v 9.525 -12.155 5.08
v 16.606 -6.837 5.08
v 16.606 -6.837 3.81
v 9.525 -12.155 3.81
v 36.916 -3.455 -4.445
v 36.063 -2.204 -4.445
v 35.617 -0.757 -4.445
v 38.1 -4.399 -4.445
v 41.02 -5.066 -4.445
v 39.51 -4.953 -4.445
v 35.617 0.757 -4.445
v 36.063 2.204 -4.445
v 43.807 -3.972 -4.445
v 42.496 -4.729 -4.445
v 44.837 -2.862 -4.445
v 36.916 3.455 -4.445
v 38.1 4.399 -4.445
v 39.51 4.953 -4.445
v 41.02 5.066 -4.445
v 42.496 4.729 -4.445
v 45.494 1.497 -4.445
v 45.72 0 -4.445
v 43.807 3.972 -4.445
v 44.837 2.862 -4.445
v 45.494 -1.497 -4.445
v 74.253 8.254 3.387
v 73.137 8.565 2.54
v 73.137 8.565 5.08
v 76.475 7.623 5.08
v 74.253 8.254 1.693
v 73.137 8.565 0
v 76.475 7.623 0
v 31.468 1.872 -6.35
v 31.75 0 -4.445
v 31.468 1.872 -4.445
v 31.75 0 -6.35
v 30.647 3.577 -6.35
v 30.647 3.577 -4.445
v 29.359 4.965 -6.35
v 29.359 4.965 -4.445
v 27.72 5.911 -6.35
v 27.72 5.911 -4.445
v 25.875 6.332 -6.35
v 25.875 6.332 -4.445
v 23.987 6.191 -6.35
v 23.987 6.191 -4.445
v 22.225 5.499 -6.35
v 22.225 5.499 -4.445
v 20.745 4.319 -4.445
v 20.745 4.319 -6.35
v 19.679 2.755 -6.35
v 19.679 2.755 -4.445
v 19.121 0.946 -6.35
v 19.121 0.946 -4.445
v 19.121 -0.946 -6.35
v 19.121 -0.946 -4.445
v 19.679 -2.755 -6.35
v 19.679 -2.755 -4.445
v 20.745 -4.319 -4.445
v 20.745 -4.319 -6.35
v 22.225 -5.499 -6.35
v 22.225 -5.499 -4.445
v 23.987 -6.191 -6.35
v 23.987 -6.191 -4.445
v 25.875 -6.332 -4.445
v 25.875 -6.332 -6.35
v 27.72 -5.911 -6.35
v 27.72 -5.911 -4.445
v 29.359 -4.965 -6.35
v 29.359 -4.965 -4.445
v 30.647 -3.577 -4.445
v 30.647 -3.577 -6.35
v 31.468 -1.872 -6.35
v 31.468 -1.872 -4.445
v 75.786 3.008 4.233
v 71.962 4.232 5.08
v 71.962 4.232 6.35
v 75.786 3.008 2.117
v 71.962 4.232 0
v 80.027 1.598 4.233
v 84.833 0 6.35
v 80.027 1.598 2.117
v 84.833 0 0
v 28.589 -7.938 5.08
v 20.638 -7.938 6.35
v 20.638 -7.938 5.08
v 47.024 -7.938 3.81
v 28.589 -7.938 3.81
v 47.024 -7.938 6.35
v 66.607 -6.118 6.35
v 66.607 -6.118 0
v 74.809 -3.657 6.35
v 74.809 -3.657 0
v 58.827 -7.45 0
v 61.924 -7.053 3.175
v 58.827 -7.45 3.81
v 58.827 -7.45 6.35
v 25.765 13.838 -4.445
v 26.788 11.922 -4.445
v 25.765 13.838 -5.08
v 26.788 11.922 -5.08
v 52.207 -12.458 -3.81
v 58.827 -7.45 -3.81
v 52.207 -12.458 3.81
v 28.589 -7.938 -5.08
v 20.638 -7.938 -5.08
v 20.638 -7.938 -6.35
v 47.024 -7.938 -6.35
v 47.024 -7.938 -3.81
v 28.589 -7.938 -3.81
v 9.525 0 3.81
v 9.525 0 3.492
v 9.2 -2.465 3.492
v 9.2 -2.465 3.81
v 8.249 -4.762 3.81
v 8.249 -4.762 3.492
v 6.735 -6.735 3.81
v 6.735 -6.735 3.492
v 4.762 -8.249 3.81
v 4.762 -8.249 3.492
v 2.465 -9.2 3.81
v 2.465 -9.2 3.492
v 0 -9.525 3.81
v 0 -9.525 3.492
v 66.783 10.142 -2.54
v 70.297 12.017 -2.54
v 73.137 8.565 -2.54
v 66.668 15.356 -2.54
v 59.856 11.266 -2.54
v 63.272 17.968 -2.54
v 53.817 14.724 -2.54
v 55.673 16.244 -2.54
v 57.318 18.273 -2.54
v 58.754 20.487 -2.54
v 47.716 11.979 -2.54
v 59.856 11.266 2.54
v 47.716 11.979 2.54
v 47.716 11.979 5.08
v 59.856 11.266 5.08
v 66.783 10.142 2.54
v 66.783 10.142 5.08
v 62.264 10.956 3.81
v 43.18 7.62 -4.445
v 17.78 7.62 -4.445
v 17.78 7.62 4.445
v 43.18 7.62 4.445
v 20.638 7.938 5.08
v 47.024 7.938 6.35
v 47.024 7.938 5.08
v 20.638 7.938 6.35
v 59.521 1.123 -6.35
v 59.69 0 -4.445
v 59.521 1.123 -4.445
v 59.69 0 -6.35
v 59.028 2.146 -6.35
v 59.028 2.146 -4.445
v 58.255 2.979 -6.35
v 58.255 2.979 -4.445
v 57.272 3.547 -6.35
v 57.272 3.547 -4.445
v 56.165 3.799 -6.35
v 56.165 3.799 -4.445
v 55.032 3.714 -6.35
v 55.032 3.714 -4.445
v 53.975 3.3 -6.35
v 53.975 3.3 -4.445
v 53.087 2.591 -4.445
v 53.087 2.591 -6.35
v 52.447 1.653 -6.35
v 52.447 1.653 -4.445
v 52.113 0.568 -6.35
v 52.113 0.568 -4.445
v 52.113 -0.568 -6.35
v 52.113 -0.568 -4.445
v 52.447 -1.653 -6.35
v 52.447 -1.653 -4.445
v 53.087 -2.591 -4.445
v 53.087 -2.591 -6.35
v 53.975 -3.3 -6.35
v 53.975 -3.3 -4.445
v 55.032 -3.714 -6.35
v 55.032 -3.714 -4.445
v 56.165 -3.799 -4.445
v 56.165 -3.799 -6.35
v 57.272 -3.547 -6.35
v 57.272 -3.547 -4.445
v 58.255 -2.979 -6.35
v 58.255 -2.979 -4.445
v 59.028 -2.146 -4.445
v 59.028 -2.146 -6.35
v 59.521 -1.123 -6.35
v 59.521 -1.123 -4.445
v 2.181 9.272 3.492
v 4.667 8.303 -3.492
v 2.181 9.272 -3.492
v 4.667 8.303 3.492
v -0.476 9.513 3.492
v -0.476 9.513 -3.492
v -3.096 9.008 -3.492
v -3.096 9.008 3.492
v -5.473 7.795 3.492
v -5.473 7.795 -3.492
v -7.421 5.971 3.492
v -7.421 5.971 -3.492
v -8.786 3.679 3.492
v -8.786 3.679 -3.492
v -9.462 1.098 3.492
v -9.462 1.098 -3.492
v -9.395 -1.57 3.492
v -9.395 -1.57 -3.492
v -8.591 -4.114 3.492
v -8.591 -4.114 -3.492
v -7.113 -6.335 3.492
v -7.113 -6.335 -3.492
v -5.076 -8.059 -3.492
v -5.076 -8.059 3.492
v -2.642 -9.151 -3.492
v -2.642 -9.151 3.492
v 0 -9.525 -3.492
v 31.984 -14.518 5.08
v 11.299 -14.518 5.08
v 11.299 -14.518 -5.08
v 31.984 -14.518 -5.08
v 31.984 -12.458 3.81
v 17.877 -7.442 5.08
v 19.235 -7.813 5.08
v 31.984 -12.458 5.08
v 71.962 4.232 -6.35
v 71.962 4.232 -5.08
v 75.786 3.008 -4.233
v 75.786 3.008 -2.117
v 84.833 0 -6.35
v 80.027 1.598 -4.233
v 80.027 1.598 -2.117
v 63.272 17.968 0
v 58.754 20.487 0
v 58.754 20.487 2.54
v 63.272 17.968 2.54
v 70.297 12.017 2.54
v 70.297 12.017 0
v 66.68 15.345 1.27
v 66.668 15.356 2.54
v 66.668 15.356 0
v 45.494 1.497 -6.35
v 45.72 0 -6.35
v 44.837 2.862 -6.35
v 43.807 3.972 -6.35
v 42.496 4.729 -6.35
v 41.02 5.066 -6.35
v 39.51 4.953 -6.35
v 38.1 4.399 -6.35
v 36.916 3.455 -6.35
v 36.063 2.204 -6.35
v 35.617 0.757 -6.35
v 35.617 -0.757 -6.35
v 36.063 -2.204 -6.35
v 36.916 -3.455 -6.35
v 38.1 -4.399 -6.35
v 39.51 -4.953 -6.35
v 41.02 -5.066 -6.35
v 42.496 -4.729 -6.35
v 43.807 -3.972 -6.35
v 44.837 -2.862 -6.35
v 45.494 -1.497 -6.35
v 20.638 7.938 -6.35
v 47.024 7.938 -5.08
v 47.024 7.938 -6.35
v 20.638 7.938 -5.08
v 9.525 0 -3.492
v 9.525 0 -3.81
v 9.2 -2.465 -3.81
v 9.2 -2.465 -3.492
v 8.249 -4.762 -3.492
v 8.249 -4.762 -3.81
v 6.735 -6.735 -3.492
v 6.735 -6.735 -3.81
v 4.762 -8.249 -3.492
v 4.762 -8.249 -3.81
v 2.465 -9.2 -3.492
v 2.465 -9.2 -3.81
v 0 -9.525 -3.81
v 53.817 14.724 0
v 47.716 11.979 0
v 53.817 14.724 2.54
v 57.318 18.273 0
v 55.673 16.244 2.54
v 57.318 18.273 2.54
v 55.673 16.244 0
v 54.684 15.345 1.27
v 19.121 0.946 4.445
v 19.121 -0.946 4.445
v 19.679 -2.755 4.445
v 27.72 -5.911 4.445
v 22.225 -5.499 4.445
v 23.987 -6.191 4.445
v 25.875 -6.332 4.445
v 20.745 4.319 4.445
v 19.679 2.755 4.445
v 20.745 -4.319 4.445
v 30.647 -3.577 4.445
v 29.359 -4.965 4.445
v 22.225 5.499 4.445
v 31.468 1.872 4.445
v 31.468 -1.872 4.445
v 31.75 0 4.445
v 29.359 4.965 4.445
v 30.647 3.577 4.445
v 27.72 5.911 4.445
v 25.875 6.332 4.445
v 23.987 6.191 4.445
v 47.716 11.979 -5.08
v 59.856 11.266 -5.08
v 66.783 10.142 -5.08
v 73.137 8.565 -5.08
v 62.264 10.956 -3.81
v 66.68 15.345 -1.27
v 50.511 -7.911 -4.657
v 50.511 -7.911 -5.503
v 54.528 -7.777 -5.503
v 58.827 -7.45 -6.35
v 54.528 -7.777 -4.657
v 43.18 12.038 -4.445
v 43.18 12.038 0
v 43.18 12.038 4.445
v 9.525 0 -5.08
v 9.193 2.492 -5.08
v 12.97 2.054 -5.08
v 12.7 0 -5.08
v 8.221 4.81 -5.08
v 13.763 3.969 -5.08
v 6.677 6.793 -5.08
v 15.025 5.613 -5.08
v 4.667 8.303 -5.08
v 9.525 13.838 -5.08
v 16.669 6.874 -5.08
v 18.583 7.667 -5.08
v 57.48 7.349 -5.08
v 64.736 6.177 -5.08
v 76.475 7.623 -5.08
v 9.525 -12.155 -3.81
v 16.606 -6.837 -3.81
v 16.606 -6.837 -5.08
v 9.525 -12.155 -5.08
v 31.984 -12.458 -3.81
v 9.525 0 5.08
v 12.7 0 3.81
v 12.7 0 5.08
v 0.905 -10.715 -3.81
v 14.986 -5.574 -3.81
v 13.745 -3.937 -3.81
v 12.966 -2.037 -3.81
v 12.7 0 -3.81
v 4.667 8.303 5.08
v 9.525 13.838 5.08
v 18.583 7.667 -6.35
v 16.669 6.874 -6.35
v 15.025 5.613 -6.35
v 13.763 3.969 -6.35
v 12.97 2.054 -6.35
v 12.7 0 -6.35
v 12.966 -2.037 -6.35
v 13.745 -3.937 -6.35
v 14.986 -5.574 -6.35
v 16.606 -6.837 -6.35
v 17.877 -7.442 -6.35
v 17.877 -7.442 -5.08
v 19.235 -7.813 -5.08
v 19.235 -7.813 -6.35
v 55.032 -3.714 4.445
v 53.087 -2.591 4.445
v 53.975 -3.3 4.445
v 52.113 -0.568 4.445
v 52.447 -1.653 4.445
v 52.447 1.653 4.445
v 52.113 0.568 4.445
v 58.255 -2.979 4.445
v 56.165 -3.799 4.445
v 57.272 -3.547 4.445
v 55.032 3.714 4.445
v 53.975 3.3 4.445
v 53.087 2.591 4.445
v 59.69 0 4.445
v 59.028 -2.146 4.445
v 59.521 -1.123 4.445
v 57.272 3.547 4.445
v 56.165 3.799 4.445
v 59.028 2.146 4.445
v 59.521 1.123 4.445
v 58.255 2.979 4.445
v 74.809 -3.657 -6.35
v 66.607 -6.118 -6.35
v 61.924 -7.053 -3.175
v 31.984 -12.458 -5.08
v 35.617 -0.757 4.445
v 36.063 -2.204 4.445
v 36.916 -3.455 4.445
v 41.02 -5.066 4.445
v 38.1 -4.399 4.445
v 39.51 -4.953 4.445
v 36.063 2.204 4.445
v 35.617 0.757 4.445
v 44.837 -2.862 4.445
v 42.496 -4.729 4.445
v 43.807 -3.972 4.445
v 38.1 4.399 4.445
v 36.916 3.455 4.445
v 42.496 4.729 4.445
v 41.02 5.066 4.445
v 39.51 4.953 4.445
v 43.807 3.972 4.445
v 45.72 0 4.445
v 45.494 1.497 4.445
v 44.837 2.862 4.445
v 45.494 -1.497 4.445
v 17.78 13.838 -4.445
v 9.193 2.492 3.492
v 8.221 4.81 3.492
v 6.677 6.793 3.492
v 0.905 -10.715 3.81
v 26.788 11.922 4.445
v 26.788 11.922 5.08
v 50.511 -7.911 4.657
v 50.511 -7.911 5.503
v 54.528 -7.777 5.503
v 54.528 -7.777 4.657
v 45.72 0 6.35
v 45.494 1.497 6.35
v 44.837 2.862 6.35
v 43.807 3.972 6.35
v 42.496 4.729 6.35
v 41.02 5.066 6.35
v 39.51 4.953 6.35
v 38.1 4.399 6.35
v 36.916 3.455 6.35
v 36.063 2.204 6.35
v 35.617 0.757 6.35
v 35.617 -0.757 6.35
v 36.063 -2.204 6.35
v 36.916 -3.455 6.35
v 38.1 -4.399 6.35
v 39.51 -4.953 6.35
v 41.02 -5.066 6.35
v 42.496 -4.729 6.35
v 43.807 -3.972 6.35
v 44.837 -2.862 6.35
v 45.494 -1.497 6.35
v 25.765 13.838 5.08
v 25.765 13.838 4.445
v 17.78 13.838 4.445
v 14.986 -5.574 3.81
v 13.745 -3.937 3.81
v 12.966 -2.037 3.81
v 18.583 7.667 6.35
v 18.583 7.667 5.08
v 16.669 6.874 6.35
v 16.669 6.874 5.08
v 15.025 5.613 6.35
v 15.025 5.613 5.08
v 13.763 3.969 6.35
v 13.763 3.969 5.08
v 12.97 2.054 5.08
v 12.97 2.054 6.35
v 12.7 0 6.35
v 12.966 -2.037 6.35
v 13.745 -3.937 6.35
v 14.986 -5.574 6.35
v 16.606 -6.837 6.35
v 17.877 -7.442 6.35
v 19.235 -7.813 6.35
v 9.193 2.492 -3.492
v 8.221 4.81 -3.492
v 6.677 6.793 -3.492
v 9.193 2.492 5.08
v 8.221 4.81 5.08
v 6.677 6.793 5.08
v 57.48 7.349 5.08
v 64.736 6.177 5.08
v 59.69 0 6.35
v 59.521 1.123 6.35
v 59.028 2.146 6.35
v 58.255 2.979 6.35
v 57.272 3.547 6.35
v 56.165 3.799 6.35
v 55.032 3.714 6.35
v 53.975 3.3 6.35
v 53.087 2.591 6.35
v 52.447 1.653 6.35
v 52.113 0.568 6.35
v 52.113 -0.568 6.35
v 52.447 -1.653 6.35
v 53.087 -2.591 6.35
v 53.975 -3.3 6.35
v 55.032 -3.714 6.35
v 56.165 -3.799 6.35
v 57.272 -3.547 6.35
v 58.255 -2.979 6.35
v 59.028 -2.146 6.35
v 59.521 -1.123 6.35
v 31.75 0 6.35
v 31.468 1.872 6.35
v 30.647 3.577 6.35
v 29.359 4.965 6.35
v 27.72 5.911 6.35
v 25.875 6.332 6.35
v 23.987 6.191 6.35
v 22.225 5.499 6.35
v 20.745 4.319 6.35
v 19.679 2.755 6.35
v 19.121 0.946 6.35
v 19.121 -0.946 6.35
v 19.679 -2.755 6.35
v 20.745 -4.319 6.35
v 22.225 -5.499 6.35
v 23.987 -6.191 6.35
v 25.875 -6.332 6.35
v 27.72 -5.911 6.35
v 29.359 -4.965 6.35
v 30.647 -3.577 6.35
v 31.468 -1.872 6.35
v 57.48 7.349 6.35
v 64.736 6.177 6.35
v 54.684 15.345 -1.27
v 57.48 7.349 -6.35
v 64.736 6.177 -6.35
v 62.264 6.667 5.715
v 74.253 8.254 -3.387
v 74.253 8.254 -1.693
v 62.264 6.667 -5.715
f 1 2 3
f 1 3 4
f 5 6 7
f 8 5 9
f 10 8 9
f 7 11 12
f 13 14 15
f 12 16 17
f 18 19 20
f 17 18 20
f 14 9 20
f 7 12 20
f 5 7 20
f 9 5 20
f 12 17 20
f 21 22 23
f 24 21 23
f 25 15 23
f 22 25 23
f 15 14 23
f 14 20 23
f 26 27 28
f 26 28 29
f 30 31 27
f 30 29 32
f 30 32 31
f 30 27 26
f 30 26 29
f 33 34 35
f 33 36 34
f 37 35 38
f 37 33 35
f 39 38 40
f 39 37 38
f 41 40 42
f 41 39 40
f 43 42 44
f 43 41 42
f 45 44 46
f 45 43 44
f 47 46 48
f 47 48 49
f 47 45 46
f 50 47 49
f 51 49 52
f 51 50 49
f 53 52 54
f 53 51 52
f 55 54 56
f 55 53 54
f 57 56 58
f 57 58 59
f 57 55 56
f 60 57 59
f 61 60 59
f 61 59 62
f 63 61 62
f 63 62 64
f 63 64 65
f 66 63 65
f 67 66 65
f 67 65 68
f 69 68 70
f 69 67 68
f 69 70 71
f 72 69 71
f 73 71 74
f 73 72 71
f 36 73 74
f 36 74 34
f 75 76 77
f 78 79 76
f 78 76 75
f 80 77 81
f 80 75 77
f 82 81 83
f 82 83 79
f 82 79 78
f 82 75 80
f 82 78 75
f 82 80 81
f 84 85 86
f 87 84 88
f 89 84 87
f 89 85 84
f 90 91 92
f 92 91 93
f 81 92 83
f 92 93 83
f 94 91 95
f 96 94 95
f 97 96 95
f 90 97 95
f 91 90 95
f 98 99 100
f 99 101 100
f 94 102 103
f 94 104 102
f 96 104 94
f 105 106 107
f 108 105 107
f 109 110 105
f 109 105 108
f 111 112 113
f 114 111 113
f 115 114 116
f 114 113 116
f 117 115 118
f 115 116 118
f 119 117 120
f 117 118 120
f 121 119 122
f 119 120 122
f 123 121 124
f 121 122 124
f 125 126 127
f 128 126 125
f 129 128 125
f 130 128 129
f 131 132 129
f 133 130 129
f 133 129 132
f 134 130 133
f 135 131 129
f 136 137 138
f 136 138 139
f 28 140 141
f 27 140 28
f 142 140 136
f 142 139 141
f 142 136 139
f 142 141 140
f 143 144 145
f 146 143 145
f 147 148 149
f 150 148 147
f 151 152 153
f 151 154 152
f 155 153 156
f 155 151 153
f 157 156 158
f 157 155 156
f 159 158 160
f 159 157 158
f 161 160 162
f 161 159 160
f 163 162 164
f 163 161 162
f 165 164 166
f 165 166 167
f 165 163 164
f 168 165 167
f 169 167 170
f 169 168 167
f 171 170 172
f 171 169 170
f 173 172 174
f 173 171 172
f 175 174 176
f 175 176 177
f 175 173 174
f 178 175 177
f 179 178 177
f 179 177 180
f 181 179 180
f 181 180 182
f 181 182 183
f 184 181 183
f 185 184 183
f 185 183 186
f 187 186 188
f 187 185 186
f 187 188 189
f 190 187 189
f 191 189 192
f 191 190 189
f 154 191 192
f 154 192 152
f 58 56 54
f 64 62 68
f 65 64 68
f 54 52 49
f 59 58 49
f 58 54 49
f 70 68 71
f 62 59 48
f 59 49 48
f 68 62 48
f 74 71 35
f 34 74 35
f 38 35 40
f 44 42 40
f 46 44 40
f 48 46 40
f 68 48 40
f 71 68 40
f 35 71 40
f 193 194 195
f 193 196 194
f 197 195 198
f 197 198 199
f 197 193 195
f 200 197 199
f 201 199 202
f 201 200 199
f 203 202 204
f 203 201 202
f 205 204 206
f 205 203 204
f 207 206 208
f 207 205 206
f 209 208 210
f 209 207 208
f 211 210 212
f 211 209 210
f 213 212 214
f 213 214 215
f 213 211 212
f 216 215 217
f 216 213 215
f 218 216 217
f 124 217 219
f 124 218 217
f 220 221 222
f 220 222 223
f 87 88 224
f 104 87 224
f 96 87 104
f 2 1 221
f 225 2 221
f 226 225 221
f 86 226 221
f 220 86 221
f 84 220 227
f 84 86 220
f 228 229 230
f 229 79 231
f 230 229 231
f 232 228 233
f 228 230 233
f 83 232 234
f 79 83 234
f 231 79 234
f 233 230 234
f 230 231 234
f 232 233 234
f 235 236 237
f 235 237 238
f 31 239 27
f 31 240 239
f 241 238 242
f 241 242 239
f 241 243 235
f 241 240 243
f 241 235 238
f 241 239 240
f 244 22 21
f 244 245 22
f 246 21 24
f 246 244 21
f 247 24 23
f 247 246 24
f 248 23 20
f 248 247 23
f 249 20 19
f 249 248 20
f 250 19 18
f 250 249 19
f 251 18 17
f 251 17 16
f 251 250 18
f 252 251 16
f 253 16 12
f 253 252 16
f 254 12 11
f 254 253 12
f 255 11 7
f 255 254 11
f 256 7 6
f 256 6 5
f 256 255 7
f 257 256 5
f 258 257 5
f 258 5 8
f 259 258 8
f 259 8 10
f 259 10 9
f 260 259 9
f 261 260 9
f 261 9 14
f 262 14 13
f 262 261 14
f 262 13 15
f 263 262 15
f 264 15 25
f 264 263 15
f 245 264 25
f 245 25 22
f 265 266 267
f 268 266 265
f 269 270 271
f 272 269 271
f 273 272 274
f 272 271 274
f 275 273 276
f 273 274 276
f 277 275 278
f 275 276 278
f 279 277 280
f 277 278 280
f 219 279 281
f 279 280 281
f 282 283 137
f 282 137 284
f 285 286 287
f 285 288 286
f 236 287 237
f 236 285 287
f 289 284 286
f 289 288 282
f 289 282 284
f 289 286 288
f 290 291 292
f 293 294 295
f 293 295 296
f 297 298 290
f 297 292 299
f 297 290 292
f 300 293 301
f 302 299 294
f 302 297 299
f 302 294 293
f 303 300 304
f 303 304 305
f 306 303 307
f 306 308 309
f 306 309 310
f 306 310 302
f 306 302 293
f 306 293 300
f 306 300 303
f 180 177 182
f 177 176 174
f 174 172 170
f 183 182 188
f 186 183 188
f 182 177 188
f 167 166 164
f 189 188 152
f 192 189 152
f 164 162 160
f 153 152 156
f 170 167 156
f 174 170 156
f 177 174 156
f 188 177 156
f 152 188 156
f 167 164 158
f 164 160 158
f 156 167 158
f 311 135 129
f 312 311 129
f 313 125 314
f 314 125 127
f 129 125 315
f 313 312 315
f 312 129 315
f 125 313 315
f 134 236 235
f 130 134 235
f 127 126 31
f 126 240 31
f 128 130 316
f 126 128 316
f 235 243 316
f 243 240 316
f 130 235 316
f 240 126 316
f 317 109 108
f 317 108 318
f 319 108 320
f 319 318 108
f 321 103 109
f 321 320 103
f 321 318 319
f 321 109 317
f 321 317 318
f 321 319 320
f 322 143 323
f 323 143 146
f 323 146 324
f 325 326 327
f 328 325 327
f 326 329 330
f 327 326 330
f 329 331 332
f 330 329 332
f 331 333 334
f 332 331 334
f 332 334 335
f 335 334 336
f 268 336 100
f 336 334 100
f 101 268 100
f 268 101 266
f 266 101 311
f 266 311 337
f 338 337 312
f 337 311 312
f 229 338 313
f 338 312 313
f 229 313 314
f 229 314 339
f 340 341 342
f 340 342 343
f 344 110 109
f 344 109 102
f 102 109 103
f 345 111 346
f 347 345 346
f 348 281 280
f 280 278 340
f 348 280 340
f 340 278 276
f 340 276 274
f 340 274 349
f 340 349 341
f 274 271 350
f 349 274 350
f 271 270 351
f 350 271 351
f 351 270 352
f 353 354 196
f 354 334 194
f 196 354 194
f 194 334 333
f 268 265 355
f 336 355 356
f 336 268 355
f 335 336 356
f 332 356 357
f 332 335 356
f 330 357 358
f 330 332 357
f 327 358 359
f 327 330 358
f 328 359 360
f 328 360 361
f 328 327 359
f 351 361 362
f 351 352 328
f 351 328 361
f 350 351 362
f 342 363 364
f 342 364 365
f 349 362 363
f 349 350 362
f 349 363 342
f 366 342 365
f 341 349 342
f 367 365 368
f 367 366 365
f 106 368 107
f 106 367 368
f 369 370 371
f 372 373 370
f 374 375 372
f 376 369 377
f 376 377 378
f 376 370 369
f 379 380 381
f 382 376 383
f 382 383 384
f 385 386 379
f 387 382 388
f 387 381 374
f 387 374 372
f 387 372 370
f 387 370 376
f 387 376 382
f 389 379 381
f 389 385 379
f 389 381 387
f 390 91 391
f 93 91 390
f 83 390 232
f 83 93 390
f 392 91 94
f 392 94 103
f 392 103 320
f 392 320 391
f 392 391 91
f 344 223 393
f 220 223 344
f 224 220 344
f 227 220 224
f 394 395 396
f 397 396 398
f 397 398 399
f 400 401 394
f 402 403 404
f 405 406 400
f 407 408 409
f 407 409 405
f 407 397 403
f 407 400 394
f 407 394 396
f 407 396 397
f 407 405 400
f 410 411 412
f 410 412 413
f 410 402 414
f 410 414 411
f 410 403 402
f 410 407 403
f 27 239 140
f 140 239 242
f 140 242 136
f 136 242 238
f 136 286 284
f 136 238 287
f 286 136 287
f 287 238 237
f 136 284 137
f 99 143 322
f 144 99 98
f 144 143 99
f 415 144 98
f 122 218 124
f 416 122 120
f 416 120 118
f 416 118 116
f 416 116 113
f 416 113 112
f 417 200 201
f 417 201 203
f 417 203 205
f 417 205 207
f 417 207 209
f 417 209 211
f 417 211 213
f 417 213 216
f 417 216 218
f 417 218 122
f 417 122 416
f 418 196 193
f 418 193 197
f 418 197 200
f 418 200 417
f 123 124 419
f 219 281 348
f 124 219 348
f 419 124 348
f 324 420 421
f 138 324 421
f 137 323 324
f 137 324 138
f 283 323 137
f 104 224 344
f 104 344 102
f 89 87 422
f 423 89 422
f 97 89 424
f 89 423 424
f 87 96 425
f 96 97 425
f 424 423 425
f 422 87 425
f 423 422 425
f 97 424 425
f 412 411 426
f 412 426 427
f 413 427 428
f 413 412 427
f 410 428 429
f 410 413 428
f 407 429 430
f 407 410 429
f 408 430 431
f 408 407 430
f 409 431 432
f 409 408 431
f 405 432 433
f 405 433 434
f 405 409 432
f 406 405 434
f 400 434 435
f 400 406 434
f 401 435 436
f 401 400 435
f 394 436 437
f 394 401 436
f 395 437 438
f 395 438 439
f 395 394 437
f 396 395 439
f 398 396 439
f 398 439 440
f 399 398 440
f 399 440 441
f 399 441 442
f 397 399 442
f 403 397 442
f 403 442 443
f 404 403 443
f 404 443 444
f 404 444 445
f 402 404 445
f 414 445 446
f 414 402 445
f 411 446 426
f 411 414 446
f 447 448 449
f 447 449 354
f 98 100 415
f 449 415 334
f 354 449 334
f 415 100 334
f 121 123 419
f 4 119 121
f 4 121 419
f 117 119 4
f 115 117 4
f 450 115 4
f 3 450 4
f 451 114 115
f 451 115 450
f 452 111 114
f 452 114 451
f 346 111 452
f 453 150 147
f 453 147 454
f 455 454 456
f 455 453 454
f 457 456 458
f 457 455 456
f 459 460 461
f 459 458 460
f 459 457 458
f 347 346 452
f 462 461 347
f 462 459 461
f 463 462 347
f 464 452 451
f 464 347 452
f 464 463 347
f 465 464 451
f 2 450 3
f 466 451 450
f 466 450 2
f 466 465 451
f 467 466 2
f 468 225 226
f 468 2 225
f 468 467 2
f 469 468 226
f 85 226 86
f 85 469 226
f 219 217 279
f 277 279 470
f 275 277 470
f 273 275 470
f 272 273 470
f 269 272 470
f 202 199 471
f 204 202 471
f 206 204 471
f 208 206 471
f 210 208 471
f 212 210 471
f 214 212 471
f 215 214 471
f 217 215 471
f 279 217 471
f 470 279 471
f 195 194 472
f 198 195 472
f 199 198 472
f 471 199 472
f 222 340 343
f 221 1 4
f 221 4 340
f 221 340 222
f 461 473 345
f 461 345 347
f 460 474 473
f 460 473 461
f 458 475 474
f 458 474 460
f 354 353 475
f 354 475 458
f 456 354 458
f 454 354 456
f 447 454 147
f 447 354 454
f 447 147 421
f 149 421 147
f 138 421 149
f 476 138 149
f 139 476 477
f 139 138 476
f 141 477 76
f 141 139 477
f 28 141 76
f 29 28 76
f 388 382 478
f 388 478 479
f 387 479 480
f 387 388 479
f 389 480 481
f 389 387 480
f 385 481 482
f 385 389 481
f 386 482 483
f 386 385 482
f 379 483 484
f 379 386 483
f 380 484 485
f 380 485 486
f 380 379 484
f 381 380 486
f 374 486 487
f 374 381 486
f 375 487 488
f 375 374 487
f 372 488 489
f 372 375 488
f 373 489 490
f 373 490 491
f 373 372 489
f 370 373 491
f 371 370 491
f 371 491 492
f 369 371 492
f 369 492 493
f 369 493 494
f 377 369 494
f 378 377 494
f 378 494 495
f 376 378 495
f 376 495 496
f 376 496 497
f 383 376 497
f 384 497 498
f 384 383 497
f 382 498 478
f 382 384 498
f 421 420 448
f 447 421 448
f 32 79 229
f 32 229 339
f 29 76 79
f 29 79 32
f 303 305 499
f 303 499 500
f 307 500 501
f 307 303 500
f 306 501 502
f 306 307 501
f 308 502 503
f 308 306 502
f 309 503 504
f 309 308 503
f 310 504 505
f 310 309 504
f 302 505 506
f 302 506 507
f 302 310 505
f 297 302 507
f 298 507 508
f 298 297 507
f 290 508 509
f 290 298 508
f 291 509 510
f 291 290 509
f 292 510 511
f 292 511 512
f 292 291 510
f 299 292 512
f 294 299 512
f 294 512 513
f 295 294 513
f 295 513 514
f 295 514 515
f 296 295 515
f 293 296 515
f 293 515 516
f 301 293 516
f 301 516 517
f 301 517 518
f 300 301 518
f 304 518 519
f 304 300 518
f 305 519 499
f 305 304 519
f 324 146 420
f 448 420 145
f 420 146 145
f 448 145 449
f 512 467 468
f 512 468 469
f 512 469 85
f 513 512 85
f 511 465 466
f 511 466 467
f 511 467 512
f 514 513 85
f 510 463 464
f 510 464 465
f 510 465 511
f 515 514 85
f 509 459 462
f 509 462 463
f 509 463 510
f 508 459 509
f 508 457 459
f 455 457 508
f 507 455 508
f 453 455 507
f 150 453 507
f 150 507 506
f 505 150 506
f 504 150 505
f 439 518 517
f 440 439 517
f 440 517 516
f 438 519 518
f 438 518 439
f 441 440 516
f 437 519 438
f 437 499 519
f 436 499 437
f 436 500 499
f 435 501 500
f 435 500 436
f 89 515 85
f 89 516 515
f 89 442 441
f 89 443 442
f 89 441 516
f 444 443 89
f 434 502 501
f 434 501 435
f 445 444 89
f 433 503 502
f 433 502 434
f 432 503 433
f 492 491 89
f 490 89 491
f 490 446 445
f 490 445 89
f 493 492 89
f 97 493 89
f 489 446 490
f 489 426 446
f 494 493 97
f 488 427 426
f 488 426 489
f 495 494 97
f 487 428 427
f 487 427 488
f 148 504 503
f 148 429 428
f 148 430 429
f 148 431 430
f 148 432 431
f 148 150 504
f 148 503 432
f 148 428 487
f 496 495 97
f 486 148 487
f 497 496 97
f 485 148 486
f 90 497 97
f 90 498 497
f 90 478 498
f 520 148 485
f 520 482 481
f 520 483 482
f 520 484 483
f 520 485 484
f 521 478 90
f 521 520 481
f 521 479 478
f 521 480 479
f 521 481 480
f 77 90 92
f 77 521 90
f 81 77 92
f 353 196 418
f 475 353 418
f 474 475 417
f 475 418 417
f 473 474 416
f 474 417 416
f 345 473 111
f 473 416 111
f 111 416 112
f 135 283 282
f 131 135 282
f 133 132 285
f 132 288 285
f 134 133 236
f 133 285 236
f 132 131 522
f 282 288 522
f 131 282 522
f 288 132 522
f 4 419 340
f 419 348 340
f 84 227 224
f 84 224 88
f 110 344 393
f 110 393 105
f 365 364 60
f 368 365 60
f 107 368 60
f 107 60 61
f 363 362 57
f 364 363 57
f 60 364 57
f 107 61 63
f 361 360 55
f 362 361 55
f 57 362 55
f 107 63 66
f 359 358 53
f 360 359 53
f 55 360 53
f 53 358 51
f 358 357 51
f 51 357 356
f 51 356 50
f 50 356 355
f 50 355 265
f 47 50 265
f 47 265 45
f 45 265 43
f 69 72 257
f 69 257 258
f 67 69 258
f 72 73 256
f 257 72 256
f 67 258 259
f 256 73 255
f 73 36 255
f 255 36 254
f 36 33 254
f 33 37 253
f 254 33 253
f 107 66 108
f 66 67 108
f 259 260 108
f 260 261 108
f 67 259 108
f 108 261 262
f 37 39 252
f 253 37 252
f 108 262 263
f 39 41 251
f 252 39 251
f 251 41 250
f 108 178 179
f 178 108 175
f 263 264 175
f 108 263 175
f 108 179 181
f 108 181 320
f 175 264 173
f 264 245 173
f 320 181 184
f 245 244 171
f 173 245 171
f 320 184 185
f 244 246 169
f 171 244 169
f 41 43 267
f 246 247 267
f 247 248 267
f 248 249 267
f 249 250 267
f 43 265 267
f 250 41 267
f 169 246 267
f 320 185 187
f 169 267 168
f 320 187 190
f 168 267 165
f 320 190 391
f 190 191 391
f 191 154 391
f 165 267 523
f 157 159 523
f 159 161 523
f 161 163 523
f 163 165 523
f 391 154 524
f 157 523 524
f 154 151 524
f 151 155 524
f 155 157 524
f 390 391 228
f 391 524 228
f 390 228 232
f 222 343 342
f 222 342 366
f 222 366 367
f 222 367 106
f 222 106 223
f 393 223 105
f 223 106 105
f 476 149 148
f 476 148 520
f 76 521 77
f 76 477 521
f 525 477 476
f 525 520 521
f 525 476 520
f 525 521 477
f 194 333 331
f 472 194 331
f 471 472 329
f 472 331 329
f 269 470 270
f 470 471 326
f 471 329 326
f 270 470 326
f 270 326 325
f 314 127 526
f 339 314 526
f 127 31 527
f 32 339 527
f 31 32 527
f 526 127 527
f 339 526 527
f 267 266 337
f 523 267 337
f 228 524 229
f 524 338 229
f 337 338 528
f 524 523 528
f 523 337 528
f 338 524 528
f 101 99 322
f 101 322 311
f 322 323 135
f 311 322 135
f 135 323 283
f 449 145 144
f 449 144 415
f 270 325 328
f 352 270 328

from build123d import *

# Parameters (mm, degrees)
F0_R      = 6.35
F0_R_2    = 5.08
F0_R_3    = 3.81
F1_DEPTH  = 6.35
F2_DEPTH  = 5.08
F3_DEPTH  = 3.81
F4_DEPTH  = 5.08
F5_DEPTH  = 4.445
F6_DEPTH  = 2.54
F7_DEPTH  = 3.4925
F9_W      = 25.4
F9_H      = 8.89
F10_DEPTH = 25.4


with BuildPart() as f1:
    # F0 (on Top) → F1 (new body, symmetric)
    with BuildSketch(Plane.XY):
        with BuildLine():
            ThreePointArc((20.6375, 7.9375), (15.0248399243, 5.6126600757), (12.7, 0))
            ThreePointArc((12.7, 0), (13.7452631291, -3.9371280351), (16.6057580259, -6.8373213252))
            ThreePointArc((16.6057580259, -6.8373213252), (18.5479225031, -7.657517361), (20.6375, -7.9375))
            Line((20.6375, -7.9375), (28.5891905523, -7.9375))
            Line((28.5891905523, -7.9375), (47.0239648166, -7.9375))
            add(Edge.make_bspline(
                [(47.0239648166, -7.9375), (50.1628587093, -7.9375), (54.4708534919, -7.901038248), (58.8266731571, -7.4499811863)],
                knots=[0, 0, 0, 0, 0.356398942, 0.356398942, 0.356398942, 0.356398942], degree=3))
            add(Edge.make_bspline(
                [(58.8266731571, -7.4499811863), (59.861459017, -7.3428262751), (67.7479089132, -6.3504244943), (74.9216513282, -3.7130513492), (84.8327428102, 0)],
                knots=[0.356398942, 0.356398942, 0.356398942, 0.356398942, 0.4410664934, 1, 1, 1, 1], degree=3))
            add(Edge.make_bspline(
                [(71.9619289421, 4.23150589), (75.6261537873, 3.1012059967), (79.6949939777, 1.6929446589), (84.8327428102, 0)],
                knots=[0.7129863176, 0.7129863176, 0.7129863176, 0.7129863176, 1, 1, 1, 1], degree=3))
            add(Edge.make_bspline(
                [(47.0239648166, 7.9375), (50.9085468383, 7.9375), (60.3889330239, 7.4479522989), (68.5575973368, 5.2816367669), (71.9619289421, 4.23150589)],
                knots=[0, 0, 0, 0, 0.4463297146, 0.7129863176, 0.7129863176, 0.7129863176, 0.7129863176], degree=3))
            Line((47.0239648166, 7.9375), (28.9170779288, 7.9375))
            Line((28.9170779288, 7.9375), (20.6375, 7.9375))
        make_face()
        with Locations((25.4, 0)):
            Circle(F0_R, mode=Mode.SUBTRACT)
        with Locations((40.64, 0)):
            Circle(F0_R_2, mode=Mode.SUBTRACT)
        with Locations((55.88, 0)):
            Circle(F0_R_3, mode=Mode.SUBTRACT)
    extrude(amount=F1_DEPTH, both=True)

    # F0 (on Top) → F2 (join, symmetric)
    with BuildSketch(Plane.XY):
        with BuildLine():
            ThreePointArc((4.6669778819, 8.3033091265), (8.2212708666, 4.8100239435), (9.525, 0))
            Line((9.525, 0), (12.7, 0))
            ThreePointArc((12.7, 0), (15.0248399243, 5.6126600757), (20.6375, 7.9375))
            Line((20.6375, 7.9375), (28.9170779288, 7.9375))
            Line((28.9170779288, 7.9375), (26.7881988015, 11.9220871824))
            Line((26.7881988015, 11.9220871824), (25.7645715028, 13.837993145))
            Line((25.7645715028, 13.837993145), (9.525, 13.837993145))
            Line((9.525, 13.837993145), (4.6669778819, 8.3033091265))
        make_face()
        with BuildLine():
            ThreePointArc((20.6375, -7.9375), (18.5479225031, -7.657517361), (16.6057580259, -6.8373213252))
            Line((16.6057580259, -6.8373213252), (9.525, -12.1552748606))
            Line((9.525, -12.1552748606), (11.2992681047, -14.5176804436))
            Line((11.2992681047, -14.5176804436), (31.9844596088, -14.5176804436))
            Line((31.9844596088, -14.5176804436), (31.9844596088, -12.4582387507))
            Line((31.9844596088, -12.4582387507), (28.5891905523, -7.9375))
            Line((28.5891905523, -7.9375), (20.6375, -7.9375))
        make_face()
    extrude(amount=F2_DEPTH, both=True)

    # F0 (on Top) → F3 (join, symmetric)
    with BuildSketch(Plane.XY):
        with BuildLine():
            Line((12.7, 0), (9.525, 0))
            ThreePointArc((9.525, 0), (6.7351920908, -6.7351920908), (0, -9.525))
            Line((0, -9.525), (0.9048060165, -10.7147200033))
            Line((0.9048060165, -10.7147200033), (9.525, -12.1552748606))
            Line((9.525, -12.1552748606), (16.6057580259, -6.8373213252))
            ThreePointArc((16.6057580259, -6.8373213252), (13.7452631291, -3.9371280351), (12.7, 0))
        make_face()
        with BuildLine():
            Line((47.0239648166, -7.9375), (28.5891905523, -7.9375))
            Line((28.5891905523, -7.9375), (31.9844596088, -12.4582387507))
            Line((31.9844596088, -12.4582387507), (52.2072799504, -12.4582387507))
            Line((52.2072799504, -12.4582387507), (58.8266731571, -7.4499811863))
            add(Edge.make_bspline(
                [(47.0239648166, -7.9375), (50.1628587093, -7.9375), (54.4708534919, -7.901038248), (58.8266731571, -7.4499811863)],
                knots=[0, 0, 0, 0, 0.356398942, 0.356398942, 0.356398942, 0.356398942], degree=3))
        make_face()
    extrude(amount=F3_DEPTH, both=True)

    # F0 (on Top) → F4 (join, symmetric)
    with BuildSketch(Plane.XY):
        with BuildLine():
            Line((26.7881988015, 11.9220871824), (28.9170779288, 7.9375))
            Line((28.9170779288, 7.9375), (47.0239648166, 7.9375))
            add(Edge.make_bspline(
                [(47.0239648166, 7.9375), (50.9085468383, 7.9375), (60.3889330239, 7.4479522989), (68.5575973368, 5.2816367669), (71.9619289421, 4.23150589)],
                knots=[0, 0, 0, 0, 0.4463297146, 0.7129863176, 0.7129863176, 0.7129863176, 0.7129863176], degree=3))
            Line((71.9619289421, 4.23150589), (76.4748901129, 7.6230522245))
            add(Edge.make_bspline(
                [(73.1367582265, 8.5646662812), (74.256124111, 8.2560420222), (75.365507112, 7.9395471234), (76.4748901129, 7.6230522245)],
                knots=[0.9232867166, 0.9232867166, 0.9232867166, 0.9232867166, 1, 1, 1, 1], degree=3))
            add(Edge.make_bspline(
                [(47.7164069202, 11.9794139597), (52.6527554368, 11.8770937689), (62.0717029658, 11.3991886108), (69.7025526498, 9.5115230384), (73.1367582265, 8.5646662812)],
                knots=[0.4142511087, 0.4142511087, 0.4142511087, 0.4142511087, 0.6879309771, 0.9232867166, 0.9232867166, 0.9232867166, 0.9232867166], degree=3))
            add(Edge.make_bspline(
                [(26.7881988015, 11.9220871824), (32.1440259001, 11.9989515109), (38.8226365897, 12.0947998115), (46.2365173414, 12.0100889786), (47.7164069202, 11.9794139597)],
                knots=[0, 0, 0, 0, 0.3322034202, 0.4142511087, 0.4142511087, 0.4142511087, 0.4142511087], degree=3))
        make_face()
    extrude(amount=F4_DEPTH, both=True)

    # F0 (on Top) → F5 (join, symmetric)
    with BuildSketch(Plane.XY):
        with Locations((25.4, 0)):
            Circle(F0_R)
        with Locations((40.64, 0)):
            Circle(F0_R_2)
        with Locations((55.88, 0)):
            Circle(F0_R_3)
    extrude(amount=F5_DEPTH, both=True)

    # F0 (on Top) → F6 (join, symmetric)
    with BuildSketch(Plane.XY):
        with BuildLine():
            add(Edge.make_bspline(
                [(47.7164069202, 11.9794139597), (50.2553793255, 12.9562999117), (55.1487210053, 14.6691018672), (57.5801610639, 18.6143925282), (58.7539300323, 20.4865988344)],
                knots=[0, 0, 0, 0, 0.5206708795, 1, 1, 1, 1], degree=3))
            add(Edge.make_bspline(
                [(47.7164069202, 11.9794139597), (52.6527554368, 11.8770937689), (62.0717029658, 11.3991886108), (69.7025526498, 9.5115230384), (73.1367582265, 8.5646662812)],
                knots=[0.4142511087, 0.4142511087, 0.4142511087, 0.4142511087, 0.6879309771, 0.9232867166, 0.9232867166, 0.9232867166, 0.9232867166], degree=3))
            add(Edge.make_bspline(
                [(58.7539300323, 20.4865988344), (63.4669363499, 18.1300956756), (66.2353913937, 15.6805505534), (70.7506760955, 11.9174942374), (73.1367582265, 8.5646662812)],
                knots=[0, 0, 0, 0, 0.5011324349, 1, 1, 1, 1], degree=3))
        make_face()
    extrude(amount=F6_DEPTH, both=True)

    # F0 (on Top) → F7 (join, symmetric)
    with BuildSketch(Plane.XY):
        with BuildLine():
            ThreePointArc((0, -9.525), (6.7351920908, -6.7351920908), (9.525, 0))
            ThreePointArc((9.525, 0), (8.2212708666, 4.8100239435), (4.6669778819, 8.3033091265))
            ThreePointArc((4.6669778819, 8.3033091265), (-9.2145169279, 2.4121158316), (0, -9.525))
        make_face()
    extrude(amount=F7_DEPTH, both=True)

    # F9 (on offset) → F10 (cut)
    with BuildSketch(Plane.YZ.offset(17.78)):
        with Locations((20.32, 0)):
            Rectangle(F9_W, F9_H)
    extrude(amount=F10_DEPTH, mode=Mode.SUBTRACT)


solid = f1.part
